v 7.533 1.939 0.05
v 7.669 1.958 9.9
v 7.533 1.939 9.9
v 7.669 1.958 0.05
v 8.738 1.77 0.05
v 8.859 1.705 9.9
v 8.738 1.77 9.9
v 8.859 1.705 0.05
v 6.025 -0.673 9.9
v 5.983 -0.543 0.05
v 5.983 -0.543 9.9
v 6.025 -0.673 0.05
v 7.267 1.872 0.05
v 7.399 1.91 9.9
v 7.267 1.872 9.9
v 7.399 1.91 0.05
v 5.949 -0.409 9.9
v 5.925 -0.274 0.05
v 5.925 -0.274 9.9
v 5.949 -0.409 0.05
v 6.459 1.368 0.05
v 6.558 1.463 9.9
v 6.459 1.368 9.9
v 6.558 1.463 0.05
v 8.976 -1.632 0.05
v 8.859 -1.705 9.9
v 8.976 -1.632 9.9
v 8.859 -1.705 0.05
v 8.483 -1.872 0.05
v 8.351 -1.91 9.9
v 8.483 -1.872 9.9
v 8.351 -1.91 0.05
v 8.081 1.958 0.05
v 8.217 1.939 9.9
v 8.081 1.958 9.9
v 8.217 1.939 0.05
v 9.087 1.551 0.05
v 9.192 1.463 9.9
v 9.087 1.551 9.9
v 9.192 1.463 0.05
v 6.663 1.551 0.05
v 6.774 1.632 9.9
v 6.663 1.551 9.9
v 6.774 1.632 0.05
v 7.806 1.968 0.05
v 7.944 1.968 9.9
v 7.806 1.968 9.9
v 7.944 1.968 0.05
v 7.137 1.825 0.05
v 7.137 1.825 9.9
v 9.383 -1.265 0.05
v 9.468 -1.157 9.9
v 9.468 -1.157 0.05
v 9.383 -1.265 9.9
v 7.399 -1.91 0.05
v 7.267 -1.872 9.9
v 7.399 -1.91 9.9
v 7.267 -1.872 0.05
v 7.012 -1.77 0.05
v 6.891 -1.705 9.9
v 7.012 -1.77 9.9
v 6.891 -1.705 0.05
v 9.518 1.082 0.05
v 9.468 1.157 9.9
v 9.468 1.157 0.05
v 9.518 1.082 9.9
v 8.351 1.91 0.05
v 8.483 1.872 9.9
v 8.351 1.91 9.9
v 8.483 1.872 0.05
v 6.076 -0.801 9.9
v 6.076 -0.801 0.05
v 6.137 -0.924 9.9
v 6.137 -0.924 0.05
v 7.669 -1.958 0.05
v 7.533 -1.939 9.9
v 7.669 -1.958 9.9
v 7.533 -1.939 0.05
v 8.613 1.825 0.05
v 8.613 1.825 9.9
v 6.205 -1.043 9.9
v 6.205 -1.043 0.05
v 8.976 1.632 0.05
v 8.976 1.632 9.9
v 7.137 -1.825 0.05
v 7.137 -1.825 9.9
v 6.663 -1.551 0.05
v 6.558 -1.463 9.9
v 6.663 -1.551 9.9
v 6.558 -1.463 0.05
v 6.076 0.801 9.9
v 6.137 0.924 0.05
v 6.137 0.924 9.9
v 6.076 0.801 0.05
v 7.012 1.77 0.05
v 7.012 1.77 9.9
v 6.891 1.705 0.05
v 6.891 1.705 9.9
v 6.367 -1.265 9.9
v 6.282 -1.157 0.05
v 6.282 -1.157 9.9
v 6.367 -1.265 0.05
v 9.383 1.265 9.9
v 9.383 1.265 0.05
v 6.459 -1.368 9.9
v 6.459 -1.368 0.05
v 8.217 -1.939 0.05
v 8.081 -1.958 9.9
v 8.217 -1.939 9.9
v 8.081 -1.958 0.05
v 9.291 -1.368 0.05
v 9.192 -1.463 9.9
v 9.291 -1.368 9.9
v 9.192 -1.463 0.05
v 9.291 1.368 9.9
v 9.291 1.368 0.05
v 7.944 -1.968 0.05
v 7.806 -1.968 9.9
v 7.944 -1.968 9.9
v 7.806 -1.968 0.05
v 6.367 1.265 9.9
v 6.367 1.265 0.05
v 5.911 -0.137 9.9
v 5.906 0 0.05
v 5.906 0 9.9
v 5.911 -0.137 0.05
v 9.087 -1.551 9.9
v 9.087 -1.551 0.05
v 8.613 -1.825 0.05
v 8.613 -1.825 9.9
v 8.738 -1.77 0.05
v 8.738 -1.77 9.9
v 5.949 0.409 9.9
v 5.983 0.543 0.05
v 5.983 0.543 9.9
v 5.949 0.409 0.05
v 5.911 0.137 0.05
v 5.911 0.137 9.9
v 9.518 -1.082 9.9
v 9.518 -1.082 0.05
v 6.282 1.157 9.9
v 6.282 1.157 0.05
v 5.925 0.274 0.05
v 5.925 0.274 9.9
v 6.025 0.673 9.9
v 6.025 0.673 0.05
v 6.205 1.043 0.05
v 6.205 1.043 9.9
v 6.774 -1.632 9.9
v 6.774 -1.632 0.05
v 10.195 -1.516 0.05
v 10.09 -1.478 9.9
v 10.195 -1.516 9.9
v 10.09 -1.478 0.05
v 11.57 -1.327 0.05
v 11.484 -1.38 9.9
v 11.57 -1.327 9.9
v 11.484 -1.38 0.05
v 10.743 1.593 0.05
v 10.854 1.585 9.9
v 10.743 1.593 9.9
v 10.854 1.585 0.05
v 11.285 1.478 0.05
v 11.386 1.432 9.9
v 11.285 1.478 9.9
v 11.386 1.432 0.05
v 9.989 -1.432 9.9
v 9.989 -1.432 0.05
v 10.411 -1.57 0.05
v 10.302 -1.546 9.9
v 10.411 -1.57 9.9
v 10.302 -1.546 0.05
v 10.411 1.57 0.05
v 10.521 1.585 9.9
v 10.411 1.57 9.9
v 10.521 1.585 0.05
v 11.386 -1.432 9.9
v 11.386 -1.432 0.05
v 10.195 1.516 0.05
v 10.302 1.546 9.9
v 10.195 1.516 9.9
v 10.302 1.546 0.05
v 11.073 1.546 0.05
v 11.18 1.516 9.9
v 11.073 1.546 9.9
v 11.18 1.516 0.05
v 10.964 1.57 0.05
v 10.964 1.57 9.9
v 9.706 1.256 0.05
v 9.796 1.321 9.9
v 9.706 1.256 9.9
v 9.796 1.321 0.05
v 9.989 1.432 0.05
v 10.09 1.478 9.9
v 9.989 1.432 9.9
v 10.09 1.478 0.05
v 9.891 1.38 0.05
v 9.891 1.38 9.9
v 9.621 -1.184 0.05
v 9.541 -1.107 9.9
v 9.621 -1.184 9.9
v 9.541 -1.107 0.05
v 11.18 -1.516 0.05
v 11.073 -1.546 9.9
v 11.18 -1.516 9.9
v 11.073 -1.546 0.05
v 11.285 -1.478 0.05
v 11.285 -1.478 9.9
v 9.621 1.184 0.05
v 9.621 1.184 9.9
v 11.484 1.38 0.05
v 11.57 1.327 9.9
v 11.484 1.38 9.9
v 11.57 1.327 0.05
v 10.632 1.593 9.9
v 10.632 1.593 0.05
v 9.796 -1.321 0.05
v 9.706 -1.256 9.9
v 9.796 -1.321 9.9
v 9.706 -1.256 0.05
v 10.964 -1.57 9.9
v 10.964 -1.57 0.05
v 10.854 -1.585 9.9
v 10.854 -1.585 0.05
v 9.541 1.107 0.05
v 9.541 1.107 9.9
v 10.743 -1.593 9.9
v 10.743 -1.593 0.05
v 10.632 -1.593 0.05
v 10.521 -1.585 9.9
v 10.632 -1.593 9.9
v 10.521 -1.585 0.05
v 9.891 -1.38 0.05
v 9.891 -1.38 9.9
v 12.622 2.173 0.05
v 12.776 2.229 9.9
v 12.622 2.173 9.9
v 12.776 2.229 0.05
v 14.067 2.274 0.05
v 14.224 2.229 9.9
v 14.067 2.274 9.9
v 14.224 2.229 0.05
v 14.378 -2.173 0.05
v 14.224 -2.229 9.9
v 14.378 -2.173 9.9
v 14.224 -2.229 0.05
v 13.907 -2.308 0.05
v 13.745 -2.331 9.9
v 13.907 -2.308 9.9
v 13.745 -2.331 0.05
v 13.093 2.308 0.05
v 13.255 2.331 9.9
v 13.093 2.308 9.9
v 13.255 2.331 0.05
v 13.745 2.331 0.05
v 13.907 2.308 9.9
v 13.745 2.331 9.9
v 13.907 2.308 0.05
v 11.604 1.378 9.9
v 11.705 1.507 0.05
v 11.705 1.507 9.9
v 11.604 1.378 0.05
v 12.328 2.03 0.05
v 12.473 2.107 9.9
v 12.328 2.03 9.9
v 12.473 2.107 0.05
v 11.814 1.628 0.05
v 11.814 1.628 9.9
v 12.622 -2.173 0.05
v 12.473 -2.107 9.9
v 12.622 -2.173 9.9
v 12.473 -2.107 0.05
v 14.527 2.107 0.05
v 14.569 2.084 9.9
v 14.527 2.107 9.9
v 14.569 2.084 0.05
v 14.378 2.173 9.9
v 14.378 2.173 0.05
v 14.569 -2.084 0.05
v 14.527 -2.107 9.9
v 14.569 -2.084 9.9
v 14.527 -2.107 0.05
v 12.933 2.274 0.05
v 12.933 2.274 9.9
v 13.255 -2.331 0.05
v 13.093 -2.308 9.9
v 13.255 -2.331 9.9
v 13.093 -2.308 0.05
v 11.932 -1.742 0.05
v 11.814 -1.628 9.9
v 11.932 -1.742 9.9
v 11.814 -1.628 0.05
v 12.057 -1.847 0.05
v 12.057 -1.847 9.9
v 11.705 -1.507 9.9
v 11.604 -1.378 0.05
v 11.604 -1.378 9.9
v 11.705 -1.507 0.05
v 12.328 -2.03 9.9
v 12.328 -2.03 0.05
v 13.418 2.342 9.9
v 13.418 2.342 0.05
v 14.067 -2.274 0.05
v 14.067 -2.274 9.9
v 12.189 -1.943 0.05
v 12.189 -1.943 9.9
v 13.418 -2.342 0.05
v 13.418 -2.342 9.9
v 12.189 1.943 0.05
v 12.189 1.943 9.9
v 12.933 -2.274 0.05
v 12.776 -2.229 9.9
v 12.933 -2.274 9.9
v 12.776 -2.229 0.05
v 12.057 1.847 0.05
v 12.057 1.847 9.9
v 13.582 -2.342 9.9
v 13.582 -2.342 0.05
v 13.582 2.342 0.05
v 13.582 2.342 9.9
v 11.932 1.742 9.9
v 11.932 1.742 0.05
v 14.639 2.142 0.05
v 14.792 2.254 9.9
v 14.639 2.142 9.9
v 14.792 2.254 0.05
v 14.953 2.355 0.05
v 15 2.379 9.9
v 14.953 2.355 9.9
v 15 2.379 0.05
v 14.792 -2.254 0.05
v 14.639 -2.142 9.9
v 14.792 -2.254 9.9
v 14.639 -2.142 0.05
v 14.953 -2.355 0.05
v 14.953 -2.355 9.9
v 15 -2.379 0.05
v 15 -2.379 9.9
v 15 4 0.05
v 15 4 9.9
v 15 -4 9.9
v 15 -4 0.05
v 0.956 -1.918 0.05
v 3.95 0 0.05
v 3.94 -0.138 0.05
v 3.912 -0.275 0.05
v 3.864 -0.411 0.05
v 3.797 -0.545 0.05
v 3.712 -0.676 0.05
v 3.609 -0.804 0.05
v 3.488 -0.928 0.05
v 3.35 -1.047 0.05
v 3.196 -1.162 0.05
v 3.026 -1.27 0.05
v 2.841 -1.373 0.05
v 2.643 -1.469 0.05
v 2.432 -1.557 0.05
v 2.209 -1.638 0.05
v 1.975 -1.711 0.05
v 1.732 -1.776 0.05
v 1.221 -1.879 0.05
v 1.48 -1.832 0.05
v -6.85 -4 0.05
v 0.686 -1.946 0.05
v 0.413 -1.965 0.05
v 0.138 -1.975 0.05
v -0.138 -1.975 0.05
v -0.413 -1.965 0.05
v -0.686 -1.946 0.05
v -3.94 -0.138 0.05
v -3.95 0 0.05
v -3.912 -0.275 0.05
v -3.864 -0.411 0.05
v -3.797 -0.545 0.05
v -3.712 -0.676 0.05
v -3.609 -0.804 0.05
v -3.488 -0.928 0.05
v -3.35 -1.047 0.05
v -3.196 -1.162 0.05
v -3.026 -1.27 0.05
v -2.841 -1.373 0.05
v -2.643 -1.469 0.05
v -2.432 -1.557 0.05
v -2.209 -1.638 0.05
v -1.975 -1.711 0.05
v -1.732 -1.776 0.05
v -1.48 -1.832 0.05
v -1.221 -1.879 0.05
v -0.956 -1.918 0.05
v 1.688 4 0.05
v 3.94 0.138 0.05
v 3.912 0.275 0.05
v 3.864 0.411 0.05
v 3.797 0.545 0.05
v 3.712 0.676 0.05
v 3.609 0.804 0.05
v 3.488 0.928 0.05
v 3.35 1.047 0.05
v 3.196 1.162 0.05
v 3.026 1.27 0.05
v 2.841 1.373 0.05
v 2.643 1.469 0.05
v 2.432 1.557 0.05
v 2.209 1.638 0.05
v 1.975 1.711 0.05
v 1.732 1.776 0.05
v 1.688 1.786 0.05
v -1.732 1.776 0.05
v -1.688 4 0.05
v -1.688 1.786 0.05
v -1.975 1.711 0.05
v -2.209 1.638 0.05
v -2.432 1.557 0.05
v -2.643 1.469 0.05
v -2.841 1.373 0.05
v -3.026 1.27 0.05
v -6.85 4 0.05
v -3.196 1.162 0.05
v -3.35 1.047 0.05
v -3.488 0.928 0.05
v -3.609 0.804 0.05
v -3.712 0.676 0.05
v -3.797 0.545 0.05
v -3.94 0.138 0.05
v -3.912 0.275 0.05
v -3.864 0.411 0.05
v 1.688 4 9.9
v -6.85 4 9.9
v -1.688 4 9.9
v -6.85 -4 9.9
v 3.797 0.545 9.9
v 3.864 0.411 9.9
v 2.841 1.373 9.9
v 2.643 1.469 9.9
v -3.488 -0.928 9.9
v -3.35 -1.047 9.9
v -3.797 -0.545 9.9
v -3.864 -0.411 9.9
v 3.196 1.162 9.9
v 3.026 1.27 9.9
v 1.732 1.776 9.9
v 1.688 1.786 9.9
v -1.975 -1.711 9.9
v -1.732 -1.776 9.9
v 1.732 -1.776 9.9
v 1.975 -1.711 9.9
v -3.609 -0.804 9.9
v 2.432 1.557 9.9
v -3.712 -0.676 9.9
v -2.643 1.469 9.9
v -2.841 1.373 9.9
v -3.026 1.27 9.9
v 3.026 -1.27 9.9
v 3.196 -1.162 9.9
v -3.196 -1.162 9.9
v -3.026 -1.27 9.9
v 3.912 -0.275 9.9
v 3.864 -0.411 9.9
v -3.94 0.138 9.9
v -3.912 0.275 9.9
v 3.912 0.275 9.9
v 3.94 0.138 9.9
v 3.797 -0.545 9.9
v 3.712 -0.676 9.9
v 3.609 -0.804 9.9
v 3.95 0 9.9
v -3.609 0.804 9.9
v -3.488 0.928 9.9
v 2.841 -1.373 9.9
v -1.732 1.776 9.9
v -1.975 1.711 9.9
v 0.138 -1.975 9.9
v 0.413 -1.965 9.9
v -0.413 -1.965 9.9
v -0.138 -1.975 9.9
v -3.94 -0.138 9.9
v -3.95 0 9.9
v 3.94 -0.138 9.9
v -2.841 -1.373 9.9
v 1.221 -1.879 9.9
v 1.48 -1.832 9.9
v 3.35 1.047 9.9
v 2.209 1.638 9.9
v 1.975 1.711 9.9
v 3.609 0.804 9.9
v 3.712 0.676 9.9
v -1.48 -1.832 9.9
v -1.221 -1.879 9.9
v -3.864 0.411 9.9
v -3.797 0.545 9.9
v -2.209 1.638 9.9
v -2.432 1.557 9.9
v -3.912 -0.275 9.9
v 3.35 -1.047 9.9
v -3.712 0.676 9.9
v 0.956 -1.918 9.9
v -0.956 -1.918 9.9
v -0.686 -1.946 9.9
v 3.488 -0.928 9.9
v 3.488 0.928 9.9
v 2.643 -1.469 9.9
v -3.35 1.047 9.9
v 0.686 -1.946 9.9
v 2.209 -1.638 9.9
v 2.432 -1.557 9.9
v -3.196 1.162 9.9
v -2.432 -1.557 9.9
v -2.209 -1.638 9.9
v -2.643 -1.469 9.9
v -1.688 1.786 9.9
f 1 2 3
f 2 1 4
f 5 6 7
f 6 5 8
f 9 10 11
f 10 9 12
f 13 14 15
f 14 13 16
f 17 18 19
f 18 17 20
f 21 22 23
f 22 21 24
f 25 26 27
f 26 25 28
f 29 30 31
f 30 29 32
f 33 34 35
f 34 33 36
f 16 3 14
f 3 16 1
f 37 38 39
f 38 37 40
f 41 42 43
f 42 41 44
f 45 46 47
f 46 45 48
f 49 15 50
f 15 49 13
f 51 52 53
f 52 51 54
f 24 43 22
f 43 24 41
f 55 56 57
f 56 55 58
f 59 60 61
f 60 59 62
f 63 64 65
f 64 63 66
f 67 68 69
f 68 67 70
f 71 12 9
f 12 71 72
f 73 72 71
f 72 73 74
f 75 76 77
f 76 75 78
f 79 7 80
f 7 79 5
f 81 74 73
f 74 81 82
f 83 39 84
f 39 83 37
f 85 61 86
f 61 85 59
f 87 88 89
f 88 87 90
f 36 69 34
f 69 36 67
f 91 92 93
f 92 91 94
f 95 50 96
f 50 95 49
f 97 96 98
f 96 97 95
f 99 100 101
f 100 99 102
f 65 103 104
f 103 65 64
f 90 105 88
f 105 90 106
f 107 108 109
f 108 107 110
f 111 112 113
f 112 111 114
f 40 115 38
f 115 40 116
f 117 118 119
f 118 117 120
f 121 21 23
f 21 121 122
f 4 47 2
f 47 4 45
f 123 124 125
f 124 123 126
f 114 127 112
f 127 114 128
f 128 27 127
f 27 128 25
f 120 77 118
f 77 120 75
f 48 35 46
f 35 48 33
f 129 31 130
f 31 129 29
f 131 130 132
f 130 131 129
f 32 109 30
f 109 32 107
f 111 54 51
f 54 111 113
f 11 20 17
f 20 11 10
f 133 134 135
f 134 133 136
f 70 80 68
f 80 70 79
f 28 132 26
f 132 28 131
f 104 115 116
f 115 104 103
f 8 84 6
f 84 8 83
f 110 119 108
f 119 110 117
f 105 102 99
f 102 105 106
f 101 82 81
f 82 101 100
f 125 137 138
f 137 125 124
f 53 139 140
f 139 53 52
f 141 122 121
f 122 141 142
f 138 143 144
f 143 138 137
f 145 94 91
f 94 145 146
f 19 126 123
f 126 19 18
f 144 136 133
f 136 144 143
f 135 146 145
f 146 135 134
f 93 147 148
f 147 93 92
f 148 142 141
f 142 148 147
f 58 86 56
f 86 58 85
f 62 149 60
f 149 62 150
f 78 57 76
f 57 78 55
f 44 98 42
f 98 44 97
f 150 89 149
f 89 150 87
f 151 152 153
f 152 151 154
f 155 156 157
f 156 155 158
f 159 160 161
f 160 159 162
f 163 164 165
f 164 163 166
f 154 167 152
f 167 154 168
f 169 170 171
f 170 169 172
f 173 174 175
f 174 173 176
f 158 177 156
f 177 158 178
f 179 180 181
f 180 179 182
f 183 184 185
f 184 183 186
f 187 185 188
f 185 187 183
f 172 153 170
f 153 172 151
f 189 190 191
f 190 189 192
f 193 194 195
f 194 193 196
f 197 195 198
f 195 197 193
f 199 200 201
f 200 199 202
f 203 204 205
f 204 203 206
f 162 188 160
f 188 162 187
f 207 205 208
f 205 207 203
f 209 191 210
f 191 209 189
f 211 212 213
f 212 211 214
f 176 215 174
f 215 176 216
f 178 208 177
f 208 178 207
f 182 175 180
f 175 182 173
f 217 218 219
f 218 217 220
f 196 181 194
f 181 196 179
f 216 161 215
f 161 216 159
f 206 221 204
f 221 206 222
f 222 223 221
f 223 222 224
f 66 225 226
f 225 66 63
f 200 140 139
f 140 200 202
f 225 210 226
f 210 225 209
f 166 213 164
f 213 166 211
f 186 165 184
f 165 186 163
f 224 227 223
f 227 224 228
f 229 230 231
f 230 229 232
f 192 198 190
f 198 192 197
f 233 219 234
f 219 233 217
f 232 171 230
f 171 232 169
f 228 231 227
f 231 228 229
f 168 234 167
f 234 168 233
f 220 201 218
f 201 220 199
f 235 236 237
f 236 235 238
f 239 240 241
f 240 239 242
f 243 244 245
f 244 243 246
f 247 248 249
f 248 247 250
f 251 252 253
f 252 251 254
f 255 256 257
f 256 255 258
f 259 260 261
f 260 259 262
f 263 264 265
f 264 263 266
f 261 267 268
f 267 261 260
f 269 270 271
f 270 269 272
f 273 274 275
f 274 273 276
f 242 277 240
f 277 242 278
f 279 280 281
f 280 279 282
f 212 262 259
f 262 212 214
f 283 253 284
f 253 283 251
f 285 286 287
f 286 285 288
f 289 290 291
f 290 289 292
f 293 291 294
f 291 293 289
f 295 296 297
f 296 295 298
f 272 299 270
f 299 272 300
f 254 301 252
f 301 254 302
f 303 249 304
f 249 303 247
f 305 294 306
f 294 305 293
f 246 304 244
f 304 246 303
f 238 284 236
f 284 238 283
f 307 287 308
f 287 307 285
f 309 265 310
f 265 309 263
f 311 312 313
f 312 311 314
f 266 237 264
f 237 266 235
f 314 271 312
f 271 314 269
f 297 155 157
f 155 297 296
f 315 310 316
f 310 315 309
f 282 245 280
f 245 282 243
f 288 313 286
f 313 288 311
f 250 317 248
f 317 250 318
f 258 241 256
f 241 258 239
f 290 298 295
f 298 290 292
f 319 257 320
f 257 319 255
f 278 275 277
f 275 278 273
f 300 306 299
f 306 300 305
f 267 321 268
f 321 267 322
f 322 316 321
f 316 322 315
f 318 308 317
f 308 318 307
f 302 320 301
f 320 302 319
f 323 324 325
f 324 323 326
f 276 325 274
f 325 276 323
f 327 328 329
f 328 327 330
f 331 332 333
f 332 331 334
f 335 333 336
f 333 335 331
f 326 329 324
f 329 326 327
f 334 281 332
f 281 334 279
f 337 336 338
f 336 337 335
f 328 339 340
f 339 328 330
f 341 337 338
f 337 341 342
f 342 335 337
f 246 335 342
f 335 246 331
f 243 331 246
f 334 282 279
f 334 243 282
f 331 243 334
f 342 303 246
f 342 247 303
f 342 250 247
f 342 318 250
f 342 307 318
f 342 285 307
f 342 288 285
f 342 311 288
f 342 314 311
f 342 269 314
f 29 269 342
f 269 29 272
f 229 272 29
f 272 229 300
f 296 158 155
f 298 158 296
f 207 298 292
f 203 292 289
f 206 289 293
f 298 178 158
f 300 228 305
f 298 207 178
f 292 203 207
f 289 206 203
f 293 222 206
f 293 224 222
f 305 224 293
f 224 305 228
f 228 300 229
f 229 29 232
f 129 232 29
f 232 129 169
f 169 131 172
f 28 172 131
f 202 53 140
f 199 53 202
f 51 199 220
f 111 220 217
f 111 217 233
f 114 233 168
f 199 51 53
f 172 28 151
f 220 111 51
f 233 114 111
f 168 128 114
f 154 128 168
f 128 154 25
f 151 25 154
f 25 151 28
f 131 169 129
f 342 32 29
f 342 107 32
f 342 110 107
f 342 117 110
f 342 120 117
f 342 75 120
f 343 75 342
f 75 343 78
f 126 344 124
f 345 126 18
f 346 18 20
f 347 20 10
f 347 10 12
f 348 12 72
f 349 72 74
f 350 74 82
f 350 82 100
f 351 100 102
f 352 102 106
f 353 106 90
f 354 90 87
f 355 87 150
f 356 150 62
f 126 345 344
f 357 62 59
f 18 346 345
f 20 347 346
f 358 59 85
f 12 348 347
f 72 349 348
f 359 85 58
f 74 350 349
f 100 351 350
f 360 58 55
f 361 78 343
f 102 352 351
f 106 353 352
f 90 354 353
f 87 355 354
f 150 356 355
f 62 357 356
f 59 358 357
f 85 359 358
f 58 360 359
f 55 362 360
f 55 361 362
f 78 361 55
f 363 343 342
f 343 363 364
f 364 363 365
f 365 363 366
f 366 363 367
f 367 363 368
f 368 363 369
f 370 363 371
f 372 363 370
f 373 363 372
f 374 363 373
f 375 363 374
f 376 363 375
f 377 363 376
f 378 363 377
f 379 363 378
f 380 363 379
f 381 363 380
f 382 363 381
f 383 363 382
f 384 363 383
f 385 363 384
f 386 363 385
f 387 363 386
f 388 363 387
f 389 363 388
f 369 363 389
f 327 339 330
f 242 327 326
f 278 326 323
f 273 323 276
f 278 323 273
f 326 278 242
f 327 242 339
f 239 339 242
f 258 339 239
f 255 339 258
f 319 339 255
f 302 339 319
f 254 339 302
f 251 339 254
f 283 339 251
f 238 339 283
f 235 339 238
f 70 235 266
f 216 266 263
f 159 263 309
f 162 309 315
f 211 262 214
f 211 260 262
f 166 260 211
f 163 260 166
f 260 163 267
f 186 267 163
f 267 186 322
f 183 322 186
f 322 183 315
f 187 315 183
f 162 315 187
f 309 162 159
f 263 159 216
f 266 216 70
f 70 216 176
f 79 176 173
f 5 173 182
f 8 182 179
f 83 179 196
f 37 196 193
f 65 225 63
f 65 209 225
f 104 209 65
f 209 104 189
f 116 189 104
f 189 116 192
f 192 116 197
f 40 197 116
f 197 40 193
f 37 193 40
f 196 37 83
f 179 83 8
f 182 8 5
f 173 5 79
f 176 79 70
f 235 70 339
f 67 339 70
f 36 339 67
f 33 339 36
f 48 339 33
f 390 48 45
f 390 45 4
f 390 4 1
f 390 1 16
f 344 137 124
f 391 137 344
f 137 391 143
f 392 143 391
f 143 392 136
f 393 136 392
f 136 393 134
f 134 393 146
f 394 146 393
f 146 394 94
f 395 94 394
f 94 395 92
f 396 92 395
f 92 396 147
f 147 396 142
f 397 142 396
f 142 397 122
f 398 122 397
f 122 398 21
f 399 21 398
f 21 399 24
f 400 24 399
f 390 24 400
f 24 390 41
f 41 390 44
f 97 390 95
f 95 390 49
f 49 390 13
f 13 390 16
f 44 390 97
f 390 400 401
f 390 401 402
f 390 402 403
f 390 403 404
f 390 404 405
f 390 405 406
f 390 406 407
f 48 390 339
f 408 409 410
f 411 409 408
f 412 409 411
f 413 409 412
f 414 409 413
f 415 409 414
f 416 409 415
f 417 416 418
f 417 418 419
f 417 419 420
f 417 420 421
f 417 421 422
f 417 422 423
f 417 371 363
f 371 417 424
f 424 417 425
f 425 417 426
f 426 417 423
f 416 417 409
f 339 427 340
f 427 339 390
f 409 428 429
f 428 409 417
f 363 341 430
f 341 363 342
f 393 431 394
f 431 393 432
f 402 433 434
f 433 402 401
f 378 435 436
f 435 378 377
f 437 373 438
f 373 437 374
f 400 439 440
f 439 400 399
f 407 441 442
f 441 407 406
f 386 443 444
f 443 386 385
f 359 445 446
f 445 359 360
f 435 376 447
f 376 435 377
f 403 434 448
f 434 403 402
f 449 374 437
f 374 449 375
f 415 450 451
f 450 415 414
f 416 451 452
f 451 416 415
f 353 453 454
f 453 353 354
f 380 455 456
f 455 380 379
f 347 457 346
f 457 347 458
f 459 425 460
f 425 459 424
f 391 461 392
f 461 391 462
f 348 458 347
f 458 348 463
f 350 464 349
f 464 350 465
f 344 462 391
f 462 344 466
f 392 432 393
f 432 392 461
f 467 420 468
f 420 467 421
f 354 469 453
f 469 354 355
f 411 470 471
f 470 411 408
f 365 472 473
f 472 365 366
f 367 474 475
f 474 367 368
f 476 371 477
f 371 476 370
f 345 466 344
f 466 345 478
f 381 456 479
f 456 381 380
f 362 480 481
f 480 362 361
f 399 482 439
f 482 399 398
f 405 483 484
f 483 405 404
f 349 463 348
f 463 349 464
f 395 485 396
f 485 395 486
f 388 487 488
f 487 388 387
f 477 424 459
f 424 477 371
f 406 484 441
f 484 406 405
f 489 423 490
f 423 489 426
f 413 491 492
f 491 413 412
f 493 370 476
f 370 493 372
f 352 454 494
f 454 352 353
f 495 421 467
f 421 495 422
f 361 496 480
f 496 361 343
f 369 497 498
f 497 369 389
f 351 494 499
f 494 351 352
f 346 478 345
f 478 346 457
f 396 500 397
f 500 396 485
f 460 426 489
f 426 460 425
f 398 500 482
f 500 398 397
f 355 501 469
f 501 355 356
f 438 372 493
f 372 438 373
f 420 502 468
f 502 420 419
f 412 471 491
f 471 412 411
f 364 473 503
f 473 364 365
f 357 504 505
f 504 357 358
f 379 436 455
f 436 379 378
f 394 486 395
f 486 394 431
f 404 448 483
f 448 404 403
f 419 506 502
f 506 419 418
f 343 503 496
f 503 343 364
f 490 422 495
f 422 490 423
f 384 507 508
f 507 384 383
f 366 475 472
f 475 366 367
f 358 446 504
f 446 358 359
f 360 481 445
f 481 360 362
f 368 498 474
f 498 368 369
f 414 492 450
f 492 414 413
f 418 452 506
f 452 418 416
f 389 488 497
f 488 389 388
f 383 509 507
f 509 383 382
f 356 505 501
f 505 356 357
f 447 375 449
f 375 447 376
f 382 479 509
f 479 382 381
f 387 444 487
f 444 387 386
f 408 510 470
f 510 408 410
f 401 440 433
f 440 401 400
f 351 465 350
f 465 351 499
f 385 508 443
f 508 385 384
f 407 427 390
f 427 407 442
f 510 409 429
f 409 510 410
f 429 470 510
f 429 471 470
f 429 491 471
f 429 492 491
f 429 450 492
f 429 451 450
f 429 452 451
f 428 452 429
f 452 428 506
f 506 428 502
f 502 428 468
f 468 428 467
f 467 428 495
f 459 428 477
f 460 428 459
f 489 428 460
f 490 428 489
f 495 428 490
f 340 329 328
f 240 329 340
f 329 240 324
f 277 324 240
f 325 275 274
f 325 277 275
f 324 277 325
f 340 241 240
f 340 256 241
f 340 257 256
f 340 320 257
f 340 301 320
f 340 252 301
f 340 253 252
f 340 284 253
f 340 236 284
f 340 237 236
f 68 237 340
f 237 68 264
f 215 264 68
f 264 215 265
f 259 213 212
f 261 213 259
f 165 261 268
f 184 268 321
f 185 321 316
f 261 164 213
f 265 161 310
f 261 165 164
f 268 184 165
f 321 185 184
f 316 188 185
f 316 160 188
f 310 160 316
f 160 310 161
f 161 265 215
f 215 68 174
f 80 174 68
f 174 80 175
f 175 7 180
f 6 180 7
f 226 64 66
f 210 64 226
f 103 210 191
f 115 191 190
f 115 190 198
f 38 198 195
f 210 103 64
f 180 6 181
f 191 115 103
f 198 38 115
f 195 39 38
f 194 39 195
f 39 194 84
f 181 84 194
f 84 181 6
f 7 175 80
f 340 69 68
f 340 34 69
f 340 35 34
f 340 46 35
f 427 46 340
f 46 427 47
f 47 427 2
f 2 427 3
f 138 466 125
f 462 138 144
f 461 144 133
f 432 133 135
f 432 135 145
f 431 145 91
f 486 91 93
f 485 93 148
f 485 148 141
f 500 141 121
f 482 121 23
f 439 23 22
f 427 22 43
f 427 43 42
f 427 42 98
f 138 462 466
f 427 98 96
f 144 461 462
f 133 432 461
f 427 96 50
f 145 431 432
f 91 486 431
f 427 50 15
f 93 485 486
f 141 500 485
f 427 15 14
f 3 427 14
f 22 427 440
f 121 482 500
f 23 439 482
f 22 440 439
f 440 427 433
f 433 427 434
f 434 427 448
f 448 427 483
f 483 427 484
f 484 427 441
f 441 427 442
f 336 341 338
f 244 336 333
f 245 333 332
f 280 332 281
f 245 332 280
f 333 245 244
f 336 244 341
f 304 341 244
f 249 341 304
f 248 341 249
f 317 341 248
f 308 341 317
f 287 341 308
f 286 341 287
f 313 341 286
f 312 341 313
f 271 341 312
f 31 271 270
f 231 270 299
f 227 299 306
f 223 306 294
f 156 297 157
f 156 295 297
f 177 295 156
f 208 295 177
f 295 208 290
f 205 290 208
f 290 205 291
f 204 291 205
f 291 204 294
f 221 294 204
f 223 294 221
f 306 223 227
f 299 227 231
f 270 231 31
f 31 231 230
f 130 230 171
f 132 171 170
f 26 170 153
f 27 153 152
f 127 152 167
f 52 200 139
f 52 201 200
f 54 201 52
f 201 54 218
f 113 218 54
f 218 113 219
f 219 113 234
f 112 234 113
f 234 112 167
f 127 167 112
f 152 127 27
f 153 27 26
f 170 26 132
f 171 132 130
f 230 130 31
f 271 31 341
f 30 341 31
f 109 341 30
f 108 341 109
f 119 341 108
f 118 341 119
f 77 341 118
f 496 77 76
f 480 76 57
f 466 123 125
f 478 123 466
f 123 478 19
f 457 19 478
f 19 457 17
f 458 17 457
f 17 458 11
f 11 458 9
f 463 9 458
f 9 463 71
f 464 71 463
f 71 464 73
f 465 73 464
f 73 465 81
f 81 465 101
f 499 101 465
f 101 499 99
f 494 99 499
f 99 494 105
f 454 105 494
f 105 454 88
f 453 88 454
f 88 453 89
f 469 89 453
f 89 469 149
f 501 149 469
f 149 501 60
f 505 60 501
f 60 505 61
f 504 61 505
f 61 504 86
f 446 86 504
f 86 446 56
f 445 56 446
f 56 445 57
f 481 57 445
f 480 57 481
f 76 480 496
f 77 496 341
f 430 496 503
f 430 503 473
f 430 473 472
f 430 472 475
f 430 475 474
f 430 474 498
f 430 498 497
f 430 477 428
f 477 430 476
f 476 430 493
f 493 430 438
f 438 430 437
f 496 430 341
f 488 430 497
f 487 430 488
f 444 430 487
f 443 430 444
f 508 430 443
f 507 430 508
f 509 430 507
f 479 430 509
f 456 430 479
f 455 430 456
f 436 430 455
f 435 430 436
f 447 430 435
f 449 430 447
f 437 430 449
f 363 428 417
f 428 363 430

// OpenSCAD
$fn = 90;
CABLE_D1 = 5.5;
CABLE_D2 = 3.5 + .25;

HEIGHT = 10;

BLOCK_LENGTH = 30;
BLOCK_WIDTH  = 8;

TOLERANCE = 0.2;

EPSILON = 0.05;


module hole_central_1() {
	resize([CABLE_D1*1.4 + TOLERANCE, CABLE_D2+TOLERANCE, HEIGHT])
	cylinder(d=1, h=HEIGHT);
}

module hole_central_3() {
	translate([-CABLE_D2*.9/2, 0, 0])
	cube([CABLE_D2*.9, BLOCK_WIDTH, HEIGHT]);
}

module body() {
	difference() {
		translate([-BLOCK_LENGTH/2, -BLOCK_WIDTH/2, EPSILON])
		cube([BLOCK_LENGTH, BLOCK_WIDTH, HEIGHT-EPSILON*2]);
		hole_central_1();

		hole_central_3();

		for (i=[0:5]) {
			j = i==0 ? 1 : (i==1 ? 0 : i);
			translate([CABLE_D2*2.1 + i*CABLE_D2*.75 , 0, 0])
			cylinder(d=CABLE_D2 * (.85 +j/5) , h=HEIGHT);
		}
	}
}

intersection() {
	body();
	translate([-CABLE_D1/2*1.4 - 3, -BLOCK_WIDTH/2, 0])
	cube([BLOCK_LENGTH, BLOCK_WIDTH, HEIGHT-EPSILON*2]);
}
